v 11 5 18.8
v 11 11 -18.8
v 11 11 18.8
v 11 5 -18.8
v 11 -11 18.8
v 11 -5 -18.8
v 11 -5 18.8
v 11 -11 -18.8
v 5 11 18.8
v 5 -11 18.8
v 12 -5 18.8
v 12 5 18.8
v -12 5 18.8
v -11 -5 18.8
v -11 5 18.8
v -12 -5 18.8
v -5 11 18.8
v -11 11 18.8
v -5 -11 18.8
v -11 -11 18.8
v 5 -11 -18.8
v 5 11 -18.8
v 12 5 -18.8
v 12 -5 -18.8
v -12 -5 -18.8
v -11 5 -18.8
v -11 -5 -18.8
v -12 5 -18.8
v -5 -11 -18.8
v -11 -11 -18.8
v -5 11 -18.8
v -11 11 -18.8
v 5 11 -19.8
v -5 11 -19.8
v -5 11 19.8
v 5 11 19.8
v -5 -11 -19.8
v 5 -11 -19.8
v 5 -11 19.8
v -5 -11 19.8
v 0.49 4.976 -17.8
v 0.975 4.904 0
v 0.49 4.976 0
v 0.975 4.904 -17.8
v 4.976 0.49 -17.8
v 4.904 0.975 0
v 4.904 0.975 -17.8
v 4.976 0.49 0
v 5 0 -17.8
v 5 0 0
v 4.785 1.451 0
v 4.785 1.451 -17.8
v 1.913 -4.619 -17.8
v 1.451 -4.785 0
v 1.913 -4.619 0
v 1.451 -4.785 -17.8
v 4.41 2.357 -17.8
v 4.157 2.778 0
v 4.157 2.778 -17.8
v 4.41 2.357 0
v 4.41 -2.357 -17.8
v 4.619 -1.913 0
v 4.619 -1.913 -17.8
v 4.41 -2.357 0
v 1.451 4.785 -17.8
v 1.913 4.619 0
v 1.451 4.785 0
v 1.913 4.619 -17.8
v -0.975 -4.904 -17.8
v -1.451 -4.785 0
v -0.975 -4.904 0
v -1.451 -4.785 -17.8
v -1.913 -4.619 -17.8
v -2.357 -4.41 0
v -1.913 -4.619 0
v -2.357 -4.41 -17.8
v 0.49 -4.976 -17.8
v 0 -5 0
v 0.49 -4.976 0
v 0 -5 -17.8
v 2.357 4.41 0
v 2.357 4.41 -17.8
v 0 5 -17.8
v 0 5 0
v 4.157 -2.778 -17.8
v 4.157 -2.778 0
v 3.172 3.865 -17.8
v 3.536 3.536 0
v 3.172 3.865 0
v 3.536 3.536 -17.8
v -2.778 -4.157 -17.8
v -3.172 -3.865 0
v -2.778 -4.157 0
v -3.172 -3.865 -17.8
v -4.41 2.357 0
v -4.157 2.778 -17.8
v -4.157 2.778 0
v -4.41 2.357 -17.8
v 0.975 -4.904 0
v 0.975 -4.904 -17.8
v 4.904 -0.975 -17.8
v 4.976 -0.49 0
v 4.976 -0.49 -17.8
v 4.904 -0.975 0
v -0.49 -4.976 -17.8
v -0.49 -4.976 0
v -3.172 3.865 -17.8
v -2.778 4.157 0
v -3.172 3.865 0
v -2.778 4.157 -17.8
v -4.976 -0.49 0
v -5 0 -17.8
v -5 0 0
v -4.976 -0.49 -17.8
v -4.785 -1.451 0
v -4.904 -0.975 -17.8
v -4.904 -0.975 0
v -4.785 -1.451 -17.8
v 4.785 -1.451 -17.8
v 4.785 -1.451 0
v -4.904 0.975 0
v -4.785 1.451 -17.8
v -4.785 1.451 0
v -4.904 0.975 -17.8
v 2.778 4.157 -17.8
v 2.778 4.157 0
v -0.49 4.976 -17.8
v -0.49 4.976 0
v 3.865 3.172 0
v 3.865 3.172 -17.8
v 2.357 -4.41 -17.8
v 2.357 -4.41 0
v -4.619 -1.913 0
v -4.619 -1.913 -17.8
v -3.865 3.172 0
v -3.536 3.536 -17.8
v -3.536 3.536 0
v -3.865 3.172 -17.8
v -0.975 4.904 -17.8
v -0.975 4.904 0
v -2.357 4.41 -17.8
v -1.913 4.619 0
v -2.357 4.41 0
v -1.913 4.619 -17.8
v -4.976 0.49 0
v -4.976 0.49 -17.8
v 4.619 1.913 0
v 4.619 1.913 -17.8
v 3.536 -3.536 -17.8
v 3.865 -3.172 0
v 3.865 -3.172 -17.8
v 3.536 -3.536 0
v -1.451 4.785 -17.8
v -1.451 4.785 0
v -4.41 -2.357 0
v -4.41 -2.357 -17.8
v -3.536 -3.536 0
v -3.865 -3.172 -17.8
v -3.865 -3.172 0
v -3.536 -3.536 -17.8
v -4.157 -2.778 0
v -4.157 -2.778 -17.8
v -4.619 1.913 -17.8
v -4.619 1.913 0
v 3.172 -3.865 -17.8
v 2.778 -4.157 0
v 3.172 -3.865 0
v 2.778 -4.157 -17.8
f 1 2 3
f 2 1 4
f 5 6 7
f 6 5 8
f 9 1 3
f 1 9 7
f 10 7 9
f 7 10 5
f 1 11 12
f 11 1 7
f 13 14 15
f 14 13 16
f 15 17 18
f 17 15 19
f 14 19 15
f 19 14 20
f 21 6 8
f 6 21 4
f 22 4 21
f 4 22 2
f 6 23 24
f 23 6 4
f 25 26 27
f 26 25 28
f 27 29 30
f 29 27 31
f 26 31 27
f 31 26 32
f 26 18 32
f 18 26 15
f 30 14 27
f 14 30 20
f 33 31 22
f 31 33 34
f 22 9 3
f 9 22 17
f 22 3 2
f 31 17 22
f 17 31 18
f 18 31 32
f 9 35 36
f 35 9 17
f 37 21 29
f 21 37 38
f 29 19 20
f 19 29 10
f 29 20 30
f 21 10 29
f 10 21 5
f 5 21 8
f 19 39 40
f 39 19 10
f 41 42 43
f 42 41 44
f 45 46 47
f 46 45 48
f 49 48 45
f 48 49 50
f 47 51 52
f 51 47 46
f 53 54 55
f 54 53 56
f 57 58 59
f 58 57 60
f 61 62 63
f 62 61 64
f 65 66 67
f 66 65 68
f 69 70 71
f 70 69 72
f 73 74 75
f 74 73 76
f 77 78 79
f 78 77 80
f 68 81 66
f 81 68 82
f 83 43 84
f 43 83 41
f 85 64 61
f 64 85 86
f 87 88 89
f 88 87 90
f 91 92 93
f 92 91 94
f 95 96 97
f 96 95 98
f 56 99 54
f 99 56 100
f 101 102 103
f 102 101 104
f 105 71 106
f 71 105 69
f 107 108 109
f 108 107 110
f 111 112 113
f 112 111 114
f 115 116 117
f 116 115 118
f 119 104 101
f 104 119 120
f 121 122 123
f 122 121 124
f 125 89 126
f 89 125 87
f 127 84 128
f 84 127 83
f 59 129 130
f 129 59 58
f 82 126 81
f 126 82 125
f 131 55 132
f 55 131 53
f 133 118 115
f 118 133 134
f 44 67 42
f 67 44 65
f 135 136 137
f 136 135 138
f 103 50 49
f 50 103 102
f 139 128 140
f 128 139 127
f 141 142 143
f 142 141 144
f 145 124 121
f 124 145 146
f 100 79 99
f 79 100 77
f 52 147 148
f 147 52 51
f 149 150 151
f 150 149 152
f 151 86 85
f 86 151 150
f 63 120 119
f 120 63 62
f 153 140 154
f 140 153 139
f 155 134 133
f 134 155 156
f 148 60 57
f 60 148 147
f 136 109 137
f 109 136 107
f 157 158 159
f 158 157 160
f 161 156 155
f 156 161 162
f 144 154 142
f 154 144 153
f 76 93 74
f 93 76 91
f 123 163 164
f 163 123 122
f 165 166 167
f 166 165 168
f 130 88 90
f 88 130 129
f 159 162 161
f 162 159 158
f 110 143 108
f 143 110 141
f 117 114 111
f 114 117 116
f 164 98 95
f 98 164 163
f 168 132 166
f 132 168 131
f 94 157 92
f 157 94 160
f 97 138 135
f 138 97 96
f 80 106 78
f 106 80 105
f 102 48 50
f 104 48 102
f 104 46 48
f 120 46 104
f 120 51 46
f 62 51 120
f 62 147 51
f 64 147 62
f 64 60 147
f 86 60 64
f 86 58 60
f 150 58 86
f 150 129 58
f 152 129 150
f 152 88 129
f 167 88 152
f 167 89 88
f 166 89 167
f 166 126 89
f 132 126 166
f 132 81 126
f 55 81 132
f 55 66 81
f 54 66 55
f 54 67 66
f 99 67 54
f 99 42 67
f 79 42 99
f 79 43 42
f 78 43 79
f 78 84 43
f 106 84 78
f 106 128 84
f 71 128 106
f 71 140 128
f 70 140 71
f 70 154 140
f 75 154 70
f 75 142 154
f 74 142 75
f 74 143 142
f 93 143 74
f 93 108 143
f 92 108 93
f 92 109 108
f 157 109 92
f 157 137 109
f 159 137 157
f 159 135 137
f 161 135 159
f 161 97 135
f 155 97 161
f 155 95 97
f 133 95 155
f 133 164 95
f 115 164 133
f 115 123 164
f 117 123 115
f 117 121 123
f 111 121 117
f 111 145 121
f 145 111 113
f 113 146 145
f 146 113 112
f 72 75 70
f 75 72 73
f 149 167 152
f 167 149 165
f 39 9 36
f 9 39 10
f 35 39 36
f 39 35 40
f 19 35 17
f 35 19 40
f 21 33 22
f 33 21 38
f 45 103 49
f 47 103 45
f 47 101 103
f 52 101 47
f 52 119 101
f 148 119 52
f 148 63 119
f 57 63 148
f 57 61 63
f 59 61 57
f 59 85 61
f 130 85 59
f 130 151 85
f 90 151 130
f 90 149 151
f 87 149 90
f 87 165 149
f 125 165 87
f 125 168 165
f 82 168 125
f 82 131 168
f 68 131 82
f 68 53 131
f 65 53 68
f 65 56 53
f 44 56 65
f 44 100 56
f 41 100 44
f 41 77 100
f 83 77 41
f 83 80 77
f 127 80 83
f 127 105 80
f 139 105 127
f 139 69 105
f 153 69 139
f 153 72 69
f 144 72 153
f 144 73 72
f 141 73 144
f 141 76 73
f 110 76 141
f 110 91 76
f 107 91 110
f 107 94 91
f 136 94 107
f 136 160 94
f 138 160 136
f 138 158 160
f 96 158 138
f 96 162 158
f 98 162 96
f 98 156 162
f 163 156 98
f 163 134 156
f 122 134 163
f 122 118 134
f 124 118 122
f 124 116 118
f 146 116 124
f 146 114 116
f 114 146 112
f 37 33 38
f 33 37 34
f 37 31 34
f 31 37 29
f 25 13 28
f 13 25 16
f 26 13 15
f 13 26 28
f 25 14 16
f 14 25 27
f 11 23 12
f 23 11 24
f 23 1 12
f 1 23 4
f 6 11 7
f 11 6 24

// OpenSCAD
module mechanical_part() {
    difference() {
        // Main rectangular body
        cube([22, 22, 37.6], center=true);
        
        // Central cylindrical bore
        translate([0, 0, -18.8])
            cylinder(h=37.6, d=10, $fn=64, center=true);
    }
    
    // Top and bottom tabs
    translate([0, 0, 18.8])
        cube([10, 22, 2], center=true);
    translate([0, 0, -18.8])
        cube([10, 22, 2], center=true);
    
    // Left and right lateral protrusions
    translate([-11, 0, 0])
        cube([2, 10, 37.6], center=true);
    translate([11, 0, 0])
        cube([2, 10, 37.6], center=true);
}

mechanical_part();
